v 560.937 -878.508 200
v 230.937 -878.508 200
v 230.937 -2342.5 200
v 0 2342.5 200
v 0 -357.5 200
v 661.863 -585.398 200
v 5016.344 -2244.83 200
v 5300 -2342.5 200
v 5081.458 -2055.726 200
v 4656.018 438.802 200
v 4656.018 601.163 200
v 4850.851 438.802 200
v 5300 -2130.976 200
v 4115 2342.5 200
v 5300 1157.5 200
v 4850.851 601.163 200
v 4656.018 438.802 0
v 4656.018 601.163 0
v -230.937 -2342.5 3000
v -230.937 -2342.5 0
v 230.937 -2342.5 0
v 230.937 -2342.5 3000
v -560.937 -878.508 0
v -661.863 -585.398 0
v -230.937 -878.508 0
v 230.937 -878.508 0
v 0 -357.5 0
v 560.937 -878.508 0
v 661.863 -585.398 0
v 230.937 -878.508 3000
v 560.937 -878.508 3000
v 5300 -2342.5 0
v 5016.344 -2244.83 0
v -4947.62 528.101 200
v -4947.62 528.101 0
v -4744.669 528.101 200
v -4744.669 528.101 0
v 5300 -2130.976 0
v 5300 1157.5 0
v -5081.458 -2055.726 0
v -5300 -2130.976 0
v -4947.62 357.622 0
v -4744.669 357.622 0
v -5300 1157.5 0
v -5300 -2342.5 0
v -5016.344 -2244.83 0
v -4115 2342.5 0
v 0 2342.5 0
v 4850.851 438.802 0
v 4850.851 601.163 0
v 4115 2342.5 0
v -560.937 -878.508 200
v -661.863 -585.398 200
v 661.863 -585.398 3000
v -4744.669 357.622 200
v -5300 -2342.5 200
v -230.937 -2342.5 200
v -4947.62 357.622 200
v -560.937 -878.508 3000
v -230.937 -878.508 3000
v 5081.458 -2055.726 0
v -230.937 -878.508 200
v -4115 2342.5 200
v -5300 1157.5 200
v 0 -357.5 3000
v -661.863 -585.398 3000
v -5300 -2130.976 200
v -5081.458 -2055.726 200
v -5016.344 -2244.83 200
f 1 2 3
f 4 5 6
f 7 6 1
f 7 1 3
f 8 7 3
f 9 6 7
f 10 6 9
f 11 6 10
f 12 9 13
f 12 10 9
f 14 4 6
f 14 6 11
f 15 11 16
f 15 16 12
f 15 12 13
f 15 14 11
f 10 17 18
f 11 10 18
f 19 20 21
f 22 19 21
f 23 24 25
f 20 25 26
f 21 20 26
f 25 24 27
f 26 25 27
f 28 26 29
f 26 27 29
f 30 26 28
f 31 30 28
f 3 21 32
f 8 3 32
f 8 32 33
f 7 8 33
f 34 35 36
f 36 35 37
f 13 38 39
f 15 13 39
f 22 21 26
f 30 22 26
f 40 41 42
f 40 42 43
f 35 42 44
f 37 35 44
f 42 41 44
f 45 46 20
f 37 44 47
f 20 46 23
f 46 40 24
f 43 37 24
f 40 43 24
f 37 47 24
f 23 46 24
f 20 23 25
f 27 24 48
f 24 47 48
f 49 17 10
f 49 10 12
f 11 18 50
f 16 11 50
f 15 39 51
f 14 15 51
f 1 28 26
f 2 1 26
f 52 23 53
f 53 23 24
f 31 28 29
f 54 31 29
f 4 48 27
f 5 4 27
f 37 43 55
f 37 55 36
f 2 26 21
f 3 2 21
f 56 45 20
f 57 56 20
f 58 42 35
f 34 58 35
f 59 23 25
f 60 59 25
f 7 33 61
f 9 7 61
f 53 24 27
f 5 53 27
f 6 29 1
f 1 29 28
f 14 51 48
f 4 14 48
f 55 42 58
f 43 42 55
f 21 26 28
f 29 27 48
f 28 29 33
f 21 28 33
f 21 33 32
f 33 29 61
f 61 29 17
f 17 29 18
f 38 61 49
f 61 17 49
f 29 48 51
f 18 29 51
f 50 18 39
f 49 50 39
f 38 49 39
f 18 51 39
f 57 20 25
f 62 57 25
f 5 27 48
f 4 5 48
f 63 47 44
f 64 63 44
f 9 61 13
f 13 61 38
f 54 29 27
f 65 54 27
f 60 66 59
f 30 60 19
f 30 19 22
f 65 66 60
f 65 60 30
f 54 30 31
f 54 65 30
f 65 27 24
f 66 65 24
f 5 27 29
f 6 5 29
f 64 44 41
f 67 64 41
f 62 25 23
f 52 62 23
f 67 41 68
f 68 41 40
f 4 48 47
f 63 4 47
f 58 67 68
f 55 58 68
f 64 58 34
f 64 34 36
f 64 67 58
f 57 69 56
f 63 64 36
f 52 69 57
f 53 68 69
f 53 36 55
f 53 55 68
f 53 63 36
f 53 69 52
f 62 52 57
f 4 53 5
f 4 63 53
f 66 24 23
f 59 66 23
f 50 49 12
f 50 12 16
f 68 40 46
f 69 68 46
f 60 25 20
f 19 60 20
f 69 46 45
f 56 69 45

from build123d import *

# Parameters (mm, degrees)
F1_W      = 202.9504776001
F1_H      = 170.4788506031
F2_DEPTH  = 200
F1_W_2    = 194.8328018188
F1_H_2    = 162.3607575893
F3_DEPTH  = 200
F4_DEPTH  = 3000
F5_W      = 700
F5_H      = 700
F6_DEPTH  = 500
F7_DEPTH  = 1000
F8_DEPTH  = 1000
F5_W_2    = 661.8630029195
F5_H_2    = 172.10229188
F9_DEPTH  = 1000
F10_W     = 2400
F10_H     = 500
F11_DEPTH = 600
F12_W     = 2400
F12_H     = 500
F13_DEPTH = 600
F14_W     = 200
F14_H     = 700
F15_DEPTH = 500


with BuildPart() as f2:
    # F1 (on Top) → F2 (new body)
    with BuildSketch(Plane.XY):
        Polygon((0, 2342.5), (-4115, 2342.5), (-5300, 1157.5), (-5300, -2130.9758637627), (-5081.4580582116, -2055.725838543), (-5016.3444273202, -2244.8295536629), (-5300, -2342.5), (-230.9368750378, -2342.5), (-230.9368750378, -878.5084665558), (-560.9368750378, -878.5084665558), (-661.8630029195, -585.39770812), (0, -357.5), align=None)
        with Locations((-4846.1446762085, 442.8614228964)):
            Rectangle(F1_W, F1_H, mode=Mode.SUBTRACT)
    extrude(amount=F2_DEPTH)

    # F10 (on face) → F11 (cut)
    with BuildSketch(Plane.YZ.offset(700)):
        with Locations((442.5, 950)):
            Rectangle(F10_W, F10_H)
    extrude(amount=F11_DEPTH, mode=Mode.SUBTRACT)

    # F12 (on face) → F13 (cut)
    with BuildSketch(Plane(origin=(-700, 0, 0), x_dir=(0, -1, 0), z_dir=(-1, 0, 0))):
        with Locations((-442.5, 950)):
            Rectangle(F12_W, F12_H)
    extrude(amount=F13_DEPTH, mode=Mode.SUBTRACT)


with BuildPart() as f3:
    # F1 (on Top) → F3 (new body)
    with BuildSketch(Plane.XY):
        Polygon((4115, 2342.5), (0, 2342.5), (0, -357.5), (661.8630029195, -585.39770812), (560.9368750378, -878.5084665558), (230.9368750378, -878.5084665558), (230.9368750378, -2342.5), (5300, -2342.5), (5016.3444273202, -2244.8295536629), (5081.4580582116, -2055.725838543), (5300, -2130.9758637627), (5300, 1157.5), align=None)
        with Locations((4753.4341812134, 519.9827700853)):
            Rectangle(F1_W_2, F1_H_2, mode=Mode.SUBTRACT)
    extrude(amount=F3_DEPTH)


with BuildPart() as f4:
    # F1 (on Top) → F4 (new body)
    with BuildSketch(Plane.XY):
        Polygon((661.8630029195, -585.39770812), (0, -357.5), (-661.8630029195, -585.39770812), (-560.9368750378, -878.5084665558), (-230.9368750378, -878.5084665558), (-230.9368750378, -2342.5), (230.9368750378, -2342.5), (230.9368750378, -878.5084665558), (560.9368750378, -878.5084665558), align=None)
    extrude(amount=F4_DEPTH)


with BuildPart() as f6:
    # F5 (on face) → F6 (new body)
    with BuildSketch(Plane.XY.offset(200)):
        with Locations((-350, 1992.5)):
            Rectangle(F5_W, F5_H)
        with Locations((350, 1992.5)):
            Rectangle(F5_W, F5_H)
    extrude(amount=F6_DEPTH)


with BuildPart() as f7:
    # F5 (on face) → F7 (new body)
    with BuildSketch(Plane.XY.offset(200)):
        Polygon((700, 1642.5), (0, 1642.5), (0, -357.5), (661.8630029195, -585.39770812), (661.8630029195, -757.5), (700, -757.5), align=None)
    extrude(amount=F7_DEPTH)


with BuildPart() as f8:
    # F5 (on face) → F8 (new body)
    with BuildSketch(Plane.XY.offset(200)):
        Polygon((0, 1642.5), (-700, 1642.5), (-700, -757.5), (-661.8630029195, -757.5), (-661.8630029195, -585.39770812), (0, -357.5), align=None)
    extrude(amount=F8_DEPTH)


with BuildPart() as f9:
    # F5 (on face) → F9 (new body)
    with BuildSketch(Plane.XY.offset(200)):
        with Locations((330.9315014598, -671.44885406)):
            Rectangle(F5_W_2, F5_H_2)
    extrude(amount=F9_DEPTH)


with BuildPart() as f9b:
    # F5 (on face) → F9, piece 2 (new body)
    with BuildSketch(Plane.XY.offset(200)):
        Polygon((-661.8630029195, -585.39770812), (-661.8630029195, -757.5), (-602.6034315148, -757.5), align=None)
    extrude(amount=F9_DEPTH)


with BuildPart() as f15:
    # F14 (on face) → F15 (new body, through all)
    with BuildSketch(Plane.XY.offset(700)):
        with Locations((0, 1992.5)):
            Rectangle(F14_W, F14_H)
    extrude(amount=F15_DEPTH)


solid = Compound([f2.part, f3.part, f4.part])
